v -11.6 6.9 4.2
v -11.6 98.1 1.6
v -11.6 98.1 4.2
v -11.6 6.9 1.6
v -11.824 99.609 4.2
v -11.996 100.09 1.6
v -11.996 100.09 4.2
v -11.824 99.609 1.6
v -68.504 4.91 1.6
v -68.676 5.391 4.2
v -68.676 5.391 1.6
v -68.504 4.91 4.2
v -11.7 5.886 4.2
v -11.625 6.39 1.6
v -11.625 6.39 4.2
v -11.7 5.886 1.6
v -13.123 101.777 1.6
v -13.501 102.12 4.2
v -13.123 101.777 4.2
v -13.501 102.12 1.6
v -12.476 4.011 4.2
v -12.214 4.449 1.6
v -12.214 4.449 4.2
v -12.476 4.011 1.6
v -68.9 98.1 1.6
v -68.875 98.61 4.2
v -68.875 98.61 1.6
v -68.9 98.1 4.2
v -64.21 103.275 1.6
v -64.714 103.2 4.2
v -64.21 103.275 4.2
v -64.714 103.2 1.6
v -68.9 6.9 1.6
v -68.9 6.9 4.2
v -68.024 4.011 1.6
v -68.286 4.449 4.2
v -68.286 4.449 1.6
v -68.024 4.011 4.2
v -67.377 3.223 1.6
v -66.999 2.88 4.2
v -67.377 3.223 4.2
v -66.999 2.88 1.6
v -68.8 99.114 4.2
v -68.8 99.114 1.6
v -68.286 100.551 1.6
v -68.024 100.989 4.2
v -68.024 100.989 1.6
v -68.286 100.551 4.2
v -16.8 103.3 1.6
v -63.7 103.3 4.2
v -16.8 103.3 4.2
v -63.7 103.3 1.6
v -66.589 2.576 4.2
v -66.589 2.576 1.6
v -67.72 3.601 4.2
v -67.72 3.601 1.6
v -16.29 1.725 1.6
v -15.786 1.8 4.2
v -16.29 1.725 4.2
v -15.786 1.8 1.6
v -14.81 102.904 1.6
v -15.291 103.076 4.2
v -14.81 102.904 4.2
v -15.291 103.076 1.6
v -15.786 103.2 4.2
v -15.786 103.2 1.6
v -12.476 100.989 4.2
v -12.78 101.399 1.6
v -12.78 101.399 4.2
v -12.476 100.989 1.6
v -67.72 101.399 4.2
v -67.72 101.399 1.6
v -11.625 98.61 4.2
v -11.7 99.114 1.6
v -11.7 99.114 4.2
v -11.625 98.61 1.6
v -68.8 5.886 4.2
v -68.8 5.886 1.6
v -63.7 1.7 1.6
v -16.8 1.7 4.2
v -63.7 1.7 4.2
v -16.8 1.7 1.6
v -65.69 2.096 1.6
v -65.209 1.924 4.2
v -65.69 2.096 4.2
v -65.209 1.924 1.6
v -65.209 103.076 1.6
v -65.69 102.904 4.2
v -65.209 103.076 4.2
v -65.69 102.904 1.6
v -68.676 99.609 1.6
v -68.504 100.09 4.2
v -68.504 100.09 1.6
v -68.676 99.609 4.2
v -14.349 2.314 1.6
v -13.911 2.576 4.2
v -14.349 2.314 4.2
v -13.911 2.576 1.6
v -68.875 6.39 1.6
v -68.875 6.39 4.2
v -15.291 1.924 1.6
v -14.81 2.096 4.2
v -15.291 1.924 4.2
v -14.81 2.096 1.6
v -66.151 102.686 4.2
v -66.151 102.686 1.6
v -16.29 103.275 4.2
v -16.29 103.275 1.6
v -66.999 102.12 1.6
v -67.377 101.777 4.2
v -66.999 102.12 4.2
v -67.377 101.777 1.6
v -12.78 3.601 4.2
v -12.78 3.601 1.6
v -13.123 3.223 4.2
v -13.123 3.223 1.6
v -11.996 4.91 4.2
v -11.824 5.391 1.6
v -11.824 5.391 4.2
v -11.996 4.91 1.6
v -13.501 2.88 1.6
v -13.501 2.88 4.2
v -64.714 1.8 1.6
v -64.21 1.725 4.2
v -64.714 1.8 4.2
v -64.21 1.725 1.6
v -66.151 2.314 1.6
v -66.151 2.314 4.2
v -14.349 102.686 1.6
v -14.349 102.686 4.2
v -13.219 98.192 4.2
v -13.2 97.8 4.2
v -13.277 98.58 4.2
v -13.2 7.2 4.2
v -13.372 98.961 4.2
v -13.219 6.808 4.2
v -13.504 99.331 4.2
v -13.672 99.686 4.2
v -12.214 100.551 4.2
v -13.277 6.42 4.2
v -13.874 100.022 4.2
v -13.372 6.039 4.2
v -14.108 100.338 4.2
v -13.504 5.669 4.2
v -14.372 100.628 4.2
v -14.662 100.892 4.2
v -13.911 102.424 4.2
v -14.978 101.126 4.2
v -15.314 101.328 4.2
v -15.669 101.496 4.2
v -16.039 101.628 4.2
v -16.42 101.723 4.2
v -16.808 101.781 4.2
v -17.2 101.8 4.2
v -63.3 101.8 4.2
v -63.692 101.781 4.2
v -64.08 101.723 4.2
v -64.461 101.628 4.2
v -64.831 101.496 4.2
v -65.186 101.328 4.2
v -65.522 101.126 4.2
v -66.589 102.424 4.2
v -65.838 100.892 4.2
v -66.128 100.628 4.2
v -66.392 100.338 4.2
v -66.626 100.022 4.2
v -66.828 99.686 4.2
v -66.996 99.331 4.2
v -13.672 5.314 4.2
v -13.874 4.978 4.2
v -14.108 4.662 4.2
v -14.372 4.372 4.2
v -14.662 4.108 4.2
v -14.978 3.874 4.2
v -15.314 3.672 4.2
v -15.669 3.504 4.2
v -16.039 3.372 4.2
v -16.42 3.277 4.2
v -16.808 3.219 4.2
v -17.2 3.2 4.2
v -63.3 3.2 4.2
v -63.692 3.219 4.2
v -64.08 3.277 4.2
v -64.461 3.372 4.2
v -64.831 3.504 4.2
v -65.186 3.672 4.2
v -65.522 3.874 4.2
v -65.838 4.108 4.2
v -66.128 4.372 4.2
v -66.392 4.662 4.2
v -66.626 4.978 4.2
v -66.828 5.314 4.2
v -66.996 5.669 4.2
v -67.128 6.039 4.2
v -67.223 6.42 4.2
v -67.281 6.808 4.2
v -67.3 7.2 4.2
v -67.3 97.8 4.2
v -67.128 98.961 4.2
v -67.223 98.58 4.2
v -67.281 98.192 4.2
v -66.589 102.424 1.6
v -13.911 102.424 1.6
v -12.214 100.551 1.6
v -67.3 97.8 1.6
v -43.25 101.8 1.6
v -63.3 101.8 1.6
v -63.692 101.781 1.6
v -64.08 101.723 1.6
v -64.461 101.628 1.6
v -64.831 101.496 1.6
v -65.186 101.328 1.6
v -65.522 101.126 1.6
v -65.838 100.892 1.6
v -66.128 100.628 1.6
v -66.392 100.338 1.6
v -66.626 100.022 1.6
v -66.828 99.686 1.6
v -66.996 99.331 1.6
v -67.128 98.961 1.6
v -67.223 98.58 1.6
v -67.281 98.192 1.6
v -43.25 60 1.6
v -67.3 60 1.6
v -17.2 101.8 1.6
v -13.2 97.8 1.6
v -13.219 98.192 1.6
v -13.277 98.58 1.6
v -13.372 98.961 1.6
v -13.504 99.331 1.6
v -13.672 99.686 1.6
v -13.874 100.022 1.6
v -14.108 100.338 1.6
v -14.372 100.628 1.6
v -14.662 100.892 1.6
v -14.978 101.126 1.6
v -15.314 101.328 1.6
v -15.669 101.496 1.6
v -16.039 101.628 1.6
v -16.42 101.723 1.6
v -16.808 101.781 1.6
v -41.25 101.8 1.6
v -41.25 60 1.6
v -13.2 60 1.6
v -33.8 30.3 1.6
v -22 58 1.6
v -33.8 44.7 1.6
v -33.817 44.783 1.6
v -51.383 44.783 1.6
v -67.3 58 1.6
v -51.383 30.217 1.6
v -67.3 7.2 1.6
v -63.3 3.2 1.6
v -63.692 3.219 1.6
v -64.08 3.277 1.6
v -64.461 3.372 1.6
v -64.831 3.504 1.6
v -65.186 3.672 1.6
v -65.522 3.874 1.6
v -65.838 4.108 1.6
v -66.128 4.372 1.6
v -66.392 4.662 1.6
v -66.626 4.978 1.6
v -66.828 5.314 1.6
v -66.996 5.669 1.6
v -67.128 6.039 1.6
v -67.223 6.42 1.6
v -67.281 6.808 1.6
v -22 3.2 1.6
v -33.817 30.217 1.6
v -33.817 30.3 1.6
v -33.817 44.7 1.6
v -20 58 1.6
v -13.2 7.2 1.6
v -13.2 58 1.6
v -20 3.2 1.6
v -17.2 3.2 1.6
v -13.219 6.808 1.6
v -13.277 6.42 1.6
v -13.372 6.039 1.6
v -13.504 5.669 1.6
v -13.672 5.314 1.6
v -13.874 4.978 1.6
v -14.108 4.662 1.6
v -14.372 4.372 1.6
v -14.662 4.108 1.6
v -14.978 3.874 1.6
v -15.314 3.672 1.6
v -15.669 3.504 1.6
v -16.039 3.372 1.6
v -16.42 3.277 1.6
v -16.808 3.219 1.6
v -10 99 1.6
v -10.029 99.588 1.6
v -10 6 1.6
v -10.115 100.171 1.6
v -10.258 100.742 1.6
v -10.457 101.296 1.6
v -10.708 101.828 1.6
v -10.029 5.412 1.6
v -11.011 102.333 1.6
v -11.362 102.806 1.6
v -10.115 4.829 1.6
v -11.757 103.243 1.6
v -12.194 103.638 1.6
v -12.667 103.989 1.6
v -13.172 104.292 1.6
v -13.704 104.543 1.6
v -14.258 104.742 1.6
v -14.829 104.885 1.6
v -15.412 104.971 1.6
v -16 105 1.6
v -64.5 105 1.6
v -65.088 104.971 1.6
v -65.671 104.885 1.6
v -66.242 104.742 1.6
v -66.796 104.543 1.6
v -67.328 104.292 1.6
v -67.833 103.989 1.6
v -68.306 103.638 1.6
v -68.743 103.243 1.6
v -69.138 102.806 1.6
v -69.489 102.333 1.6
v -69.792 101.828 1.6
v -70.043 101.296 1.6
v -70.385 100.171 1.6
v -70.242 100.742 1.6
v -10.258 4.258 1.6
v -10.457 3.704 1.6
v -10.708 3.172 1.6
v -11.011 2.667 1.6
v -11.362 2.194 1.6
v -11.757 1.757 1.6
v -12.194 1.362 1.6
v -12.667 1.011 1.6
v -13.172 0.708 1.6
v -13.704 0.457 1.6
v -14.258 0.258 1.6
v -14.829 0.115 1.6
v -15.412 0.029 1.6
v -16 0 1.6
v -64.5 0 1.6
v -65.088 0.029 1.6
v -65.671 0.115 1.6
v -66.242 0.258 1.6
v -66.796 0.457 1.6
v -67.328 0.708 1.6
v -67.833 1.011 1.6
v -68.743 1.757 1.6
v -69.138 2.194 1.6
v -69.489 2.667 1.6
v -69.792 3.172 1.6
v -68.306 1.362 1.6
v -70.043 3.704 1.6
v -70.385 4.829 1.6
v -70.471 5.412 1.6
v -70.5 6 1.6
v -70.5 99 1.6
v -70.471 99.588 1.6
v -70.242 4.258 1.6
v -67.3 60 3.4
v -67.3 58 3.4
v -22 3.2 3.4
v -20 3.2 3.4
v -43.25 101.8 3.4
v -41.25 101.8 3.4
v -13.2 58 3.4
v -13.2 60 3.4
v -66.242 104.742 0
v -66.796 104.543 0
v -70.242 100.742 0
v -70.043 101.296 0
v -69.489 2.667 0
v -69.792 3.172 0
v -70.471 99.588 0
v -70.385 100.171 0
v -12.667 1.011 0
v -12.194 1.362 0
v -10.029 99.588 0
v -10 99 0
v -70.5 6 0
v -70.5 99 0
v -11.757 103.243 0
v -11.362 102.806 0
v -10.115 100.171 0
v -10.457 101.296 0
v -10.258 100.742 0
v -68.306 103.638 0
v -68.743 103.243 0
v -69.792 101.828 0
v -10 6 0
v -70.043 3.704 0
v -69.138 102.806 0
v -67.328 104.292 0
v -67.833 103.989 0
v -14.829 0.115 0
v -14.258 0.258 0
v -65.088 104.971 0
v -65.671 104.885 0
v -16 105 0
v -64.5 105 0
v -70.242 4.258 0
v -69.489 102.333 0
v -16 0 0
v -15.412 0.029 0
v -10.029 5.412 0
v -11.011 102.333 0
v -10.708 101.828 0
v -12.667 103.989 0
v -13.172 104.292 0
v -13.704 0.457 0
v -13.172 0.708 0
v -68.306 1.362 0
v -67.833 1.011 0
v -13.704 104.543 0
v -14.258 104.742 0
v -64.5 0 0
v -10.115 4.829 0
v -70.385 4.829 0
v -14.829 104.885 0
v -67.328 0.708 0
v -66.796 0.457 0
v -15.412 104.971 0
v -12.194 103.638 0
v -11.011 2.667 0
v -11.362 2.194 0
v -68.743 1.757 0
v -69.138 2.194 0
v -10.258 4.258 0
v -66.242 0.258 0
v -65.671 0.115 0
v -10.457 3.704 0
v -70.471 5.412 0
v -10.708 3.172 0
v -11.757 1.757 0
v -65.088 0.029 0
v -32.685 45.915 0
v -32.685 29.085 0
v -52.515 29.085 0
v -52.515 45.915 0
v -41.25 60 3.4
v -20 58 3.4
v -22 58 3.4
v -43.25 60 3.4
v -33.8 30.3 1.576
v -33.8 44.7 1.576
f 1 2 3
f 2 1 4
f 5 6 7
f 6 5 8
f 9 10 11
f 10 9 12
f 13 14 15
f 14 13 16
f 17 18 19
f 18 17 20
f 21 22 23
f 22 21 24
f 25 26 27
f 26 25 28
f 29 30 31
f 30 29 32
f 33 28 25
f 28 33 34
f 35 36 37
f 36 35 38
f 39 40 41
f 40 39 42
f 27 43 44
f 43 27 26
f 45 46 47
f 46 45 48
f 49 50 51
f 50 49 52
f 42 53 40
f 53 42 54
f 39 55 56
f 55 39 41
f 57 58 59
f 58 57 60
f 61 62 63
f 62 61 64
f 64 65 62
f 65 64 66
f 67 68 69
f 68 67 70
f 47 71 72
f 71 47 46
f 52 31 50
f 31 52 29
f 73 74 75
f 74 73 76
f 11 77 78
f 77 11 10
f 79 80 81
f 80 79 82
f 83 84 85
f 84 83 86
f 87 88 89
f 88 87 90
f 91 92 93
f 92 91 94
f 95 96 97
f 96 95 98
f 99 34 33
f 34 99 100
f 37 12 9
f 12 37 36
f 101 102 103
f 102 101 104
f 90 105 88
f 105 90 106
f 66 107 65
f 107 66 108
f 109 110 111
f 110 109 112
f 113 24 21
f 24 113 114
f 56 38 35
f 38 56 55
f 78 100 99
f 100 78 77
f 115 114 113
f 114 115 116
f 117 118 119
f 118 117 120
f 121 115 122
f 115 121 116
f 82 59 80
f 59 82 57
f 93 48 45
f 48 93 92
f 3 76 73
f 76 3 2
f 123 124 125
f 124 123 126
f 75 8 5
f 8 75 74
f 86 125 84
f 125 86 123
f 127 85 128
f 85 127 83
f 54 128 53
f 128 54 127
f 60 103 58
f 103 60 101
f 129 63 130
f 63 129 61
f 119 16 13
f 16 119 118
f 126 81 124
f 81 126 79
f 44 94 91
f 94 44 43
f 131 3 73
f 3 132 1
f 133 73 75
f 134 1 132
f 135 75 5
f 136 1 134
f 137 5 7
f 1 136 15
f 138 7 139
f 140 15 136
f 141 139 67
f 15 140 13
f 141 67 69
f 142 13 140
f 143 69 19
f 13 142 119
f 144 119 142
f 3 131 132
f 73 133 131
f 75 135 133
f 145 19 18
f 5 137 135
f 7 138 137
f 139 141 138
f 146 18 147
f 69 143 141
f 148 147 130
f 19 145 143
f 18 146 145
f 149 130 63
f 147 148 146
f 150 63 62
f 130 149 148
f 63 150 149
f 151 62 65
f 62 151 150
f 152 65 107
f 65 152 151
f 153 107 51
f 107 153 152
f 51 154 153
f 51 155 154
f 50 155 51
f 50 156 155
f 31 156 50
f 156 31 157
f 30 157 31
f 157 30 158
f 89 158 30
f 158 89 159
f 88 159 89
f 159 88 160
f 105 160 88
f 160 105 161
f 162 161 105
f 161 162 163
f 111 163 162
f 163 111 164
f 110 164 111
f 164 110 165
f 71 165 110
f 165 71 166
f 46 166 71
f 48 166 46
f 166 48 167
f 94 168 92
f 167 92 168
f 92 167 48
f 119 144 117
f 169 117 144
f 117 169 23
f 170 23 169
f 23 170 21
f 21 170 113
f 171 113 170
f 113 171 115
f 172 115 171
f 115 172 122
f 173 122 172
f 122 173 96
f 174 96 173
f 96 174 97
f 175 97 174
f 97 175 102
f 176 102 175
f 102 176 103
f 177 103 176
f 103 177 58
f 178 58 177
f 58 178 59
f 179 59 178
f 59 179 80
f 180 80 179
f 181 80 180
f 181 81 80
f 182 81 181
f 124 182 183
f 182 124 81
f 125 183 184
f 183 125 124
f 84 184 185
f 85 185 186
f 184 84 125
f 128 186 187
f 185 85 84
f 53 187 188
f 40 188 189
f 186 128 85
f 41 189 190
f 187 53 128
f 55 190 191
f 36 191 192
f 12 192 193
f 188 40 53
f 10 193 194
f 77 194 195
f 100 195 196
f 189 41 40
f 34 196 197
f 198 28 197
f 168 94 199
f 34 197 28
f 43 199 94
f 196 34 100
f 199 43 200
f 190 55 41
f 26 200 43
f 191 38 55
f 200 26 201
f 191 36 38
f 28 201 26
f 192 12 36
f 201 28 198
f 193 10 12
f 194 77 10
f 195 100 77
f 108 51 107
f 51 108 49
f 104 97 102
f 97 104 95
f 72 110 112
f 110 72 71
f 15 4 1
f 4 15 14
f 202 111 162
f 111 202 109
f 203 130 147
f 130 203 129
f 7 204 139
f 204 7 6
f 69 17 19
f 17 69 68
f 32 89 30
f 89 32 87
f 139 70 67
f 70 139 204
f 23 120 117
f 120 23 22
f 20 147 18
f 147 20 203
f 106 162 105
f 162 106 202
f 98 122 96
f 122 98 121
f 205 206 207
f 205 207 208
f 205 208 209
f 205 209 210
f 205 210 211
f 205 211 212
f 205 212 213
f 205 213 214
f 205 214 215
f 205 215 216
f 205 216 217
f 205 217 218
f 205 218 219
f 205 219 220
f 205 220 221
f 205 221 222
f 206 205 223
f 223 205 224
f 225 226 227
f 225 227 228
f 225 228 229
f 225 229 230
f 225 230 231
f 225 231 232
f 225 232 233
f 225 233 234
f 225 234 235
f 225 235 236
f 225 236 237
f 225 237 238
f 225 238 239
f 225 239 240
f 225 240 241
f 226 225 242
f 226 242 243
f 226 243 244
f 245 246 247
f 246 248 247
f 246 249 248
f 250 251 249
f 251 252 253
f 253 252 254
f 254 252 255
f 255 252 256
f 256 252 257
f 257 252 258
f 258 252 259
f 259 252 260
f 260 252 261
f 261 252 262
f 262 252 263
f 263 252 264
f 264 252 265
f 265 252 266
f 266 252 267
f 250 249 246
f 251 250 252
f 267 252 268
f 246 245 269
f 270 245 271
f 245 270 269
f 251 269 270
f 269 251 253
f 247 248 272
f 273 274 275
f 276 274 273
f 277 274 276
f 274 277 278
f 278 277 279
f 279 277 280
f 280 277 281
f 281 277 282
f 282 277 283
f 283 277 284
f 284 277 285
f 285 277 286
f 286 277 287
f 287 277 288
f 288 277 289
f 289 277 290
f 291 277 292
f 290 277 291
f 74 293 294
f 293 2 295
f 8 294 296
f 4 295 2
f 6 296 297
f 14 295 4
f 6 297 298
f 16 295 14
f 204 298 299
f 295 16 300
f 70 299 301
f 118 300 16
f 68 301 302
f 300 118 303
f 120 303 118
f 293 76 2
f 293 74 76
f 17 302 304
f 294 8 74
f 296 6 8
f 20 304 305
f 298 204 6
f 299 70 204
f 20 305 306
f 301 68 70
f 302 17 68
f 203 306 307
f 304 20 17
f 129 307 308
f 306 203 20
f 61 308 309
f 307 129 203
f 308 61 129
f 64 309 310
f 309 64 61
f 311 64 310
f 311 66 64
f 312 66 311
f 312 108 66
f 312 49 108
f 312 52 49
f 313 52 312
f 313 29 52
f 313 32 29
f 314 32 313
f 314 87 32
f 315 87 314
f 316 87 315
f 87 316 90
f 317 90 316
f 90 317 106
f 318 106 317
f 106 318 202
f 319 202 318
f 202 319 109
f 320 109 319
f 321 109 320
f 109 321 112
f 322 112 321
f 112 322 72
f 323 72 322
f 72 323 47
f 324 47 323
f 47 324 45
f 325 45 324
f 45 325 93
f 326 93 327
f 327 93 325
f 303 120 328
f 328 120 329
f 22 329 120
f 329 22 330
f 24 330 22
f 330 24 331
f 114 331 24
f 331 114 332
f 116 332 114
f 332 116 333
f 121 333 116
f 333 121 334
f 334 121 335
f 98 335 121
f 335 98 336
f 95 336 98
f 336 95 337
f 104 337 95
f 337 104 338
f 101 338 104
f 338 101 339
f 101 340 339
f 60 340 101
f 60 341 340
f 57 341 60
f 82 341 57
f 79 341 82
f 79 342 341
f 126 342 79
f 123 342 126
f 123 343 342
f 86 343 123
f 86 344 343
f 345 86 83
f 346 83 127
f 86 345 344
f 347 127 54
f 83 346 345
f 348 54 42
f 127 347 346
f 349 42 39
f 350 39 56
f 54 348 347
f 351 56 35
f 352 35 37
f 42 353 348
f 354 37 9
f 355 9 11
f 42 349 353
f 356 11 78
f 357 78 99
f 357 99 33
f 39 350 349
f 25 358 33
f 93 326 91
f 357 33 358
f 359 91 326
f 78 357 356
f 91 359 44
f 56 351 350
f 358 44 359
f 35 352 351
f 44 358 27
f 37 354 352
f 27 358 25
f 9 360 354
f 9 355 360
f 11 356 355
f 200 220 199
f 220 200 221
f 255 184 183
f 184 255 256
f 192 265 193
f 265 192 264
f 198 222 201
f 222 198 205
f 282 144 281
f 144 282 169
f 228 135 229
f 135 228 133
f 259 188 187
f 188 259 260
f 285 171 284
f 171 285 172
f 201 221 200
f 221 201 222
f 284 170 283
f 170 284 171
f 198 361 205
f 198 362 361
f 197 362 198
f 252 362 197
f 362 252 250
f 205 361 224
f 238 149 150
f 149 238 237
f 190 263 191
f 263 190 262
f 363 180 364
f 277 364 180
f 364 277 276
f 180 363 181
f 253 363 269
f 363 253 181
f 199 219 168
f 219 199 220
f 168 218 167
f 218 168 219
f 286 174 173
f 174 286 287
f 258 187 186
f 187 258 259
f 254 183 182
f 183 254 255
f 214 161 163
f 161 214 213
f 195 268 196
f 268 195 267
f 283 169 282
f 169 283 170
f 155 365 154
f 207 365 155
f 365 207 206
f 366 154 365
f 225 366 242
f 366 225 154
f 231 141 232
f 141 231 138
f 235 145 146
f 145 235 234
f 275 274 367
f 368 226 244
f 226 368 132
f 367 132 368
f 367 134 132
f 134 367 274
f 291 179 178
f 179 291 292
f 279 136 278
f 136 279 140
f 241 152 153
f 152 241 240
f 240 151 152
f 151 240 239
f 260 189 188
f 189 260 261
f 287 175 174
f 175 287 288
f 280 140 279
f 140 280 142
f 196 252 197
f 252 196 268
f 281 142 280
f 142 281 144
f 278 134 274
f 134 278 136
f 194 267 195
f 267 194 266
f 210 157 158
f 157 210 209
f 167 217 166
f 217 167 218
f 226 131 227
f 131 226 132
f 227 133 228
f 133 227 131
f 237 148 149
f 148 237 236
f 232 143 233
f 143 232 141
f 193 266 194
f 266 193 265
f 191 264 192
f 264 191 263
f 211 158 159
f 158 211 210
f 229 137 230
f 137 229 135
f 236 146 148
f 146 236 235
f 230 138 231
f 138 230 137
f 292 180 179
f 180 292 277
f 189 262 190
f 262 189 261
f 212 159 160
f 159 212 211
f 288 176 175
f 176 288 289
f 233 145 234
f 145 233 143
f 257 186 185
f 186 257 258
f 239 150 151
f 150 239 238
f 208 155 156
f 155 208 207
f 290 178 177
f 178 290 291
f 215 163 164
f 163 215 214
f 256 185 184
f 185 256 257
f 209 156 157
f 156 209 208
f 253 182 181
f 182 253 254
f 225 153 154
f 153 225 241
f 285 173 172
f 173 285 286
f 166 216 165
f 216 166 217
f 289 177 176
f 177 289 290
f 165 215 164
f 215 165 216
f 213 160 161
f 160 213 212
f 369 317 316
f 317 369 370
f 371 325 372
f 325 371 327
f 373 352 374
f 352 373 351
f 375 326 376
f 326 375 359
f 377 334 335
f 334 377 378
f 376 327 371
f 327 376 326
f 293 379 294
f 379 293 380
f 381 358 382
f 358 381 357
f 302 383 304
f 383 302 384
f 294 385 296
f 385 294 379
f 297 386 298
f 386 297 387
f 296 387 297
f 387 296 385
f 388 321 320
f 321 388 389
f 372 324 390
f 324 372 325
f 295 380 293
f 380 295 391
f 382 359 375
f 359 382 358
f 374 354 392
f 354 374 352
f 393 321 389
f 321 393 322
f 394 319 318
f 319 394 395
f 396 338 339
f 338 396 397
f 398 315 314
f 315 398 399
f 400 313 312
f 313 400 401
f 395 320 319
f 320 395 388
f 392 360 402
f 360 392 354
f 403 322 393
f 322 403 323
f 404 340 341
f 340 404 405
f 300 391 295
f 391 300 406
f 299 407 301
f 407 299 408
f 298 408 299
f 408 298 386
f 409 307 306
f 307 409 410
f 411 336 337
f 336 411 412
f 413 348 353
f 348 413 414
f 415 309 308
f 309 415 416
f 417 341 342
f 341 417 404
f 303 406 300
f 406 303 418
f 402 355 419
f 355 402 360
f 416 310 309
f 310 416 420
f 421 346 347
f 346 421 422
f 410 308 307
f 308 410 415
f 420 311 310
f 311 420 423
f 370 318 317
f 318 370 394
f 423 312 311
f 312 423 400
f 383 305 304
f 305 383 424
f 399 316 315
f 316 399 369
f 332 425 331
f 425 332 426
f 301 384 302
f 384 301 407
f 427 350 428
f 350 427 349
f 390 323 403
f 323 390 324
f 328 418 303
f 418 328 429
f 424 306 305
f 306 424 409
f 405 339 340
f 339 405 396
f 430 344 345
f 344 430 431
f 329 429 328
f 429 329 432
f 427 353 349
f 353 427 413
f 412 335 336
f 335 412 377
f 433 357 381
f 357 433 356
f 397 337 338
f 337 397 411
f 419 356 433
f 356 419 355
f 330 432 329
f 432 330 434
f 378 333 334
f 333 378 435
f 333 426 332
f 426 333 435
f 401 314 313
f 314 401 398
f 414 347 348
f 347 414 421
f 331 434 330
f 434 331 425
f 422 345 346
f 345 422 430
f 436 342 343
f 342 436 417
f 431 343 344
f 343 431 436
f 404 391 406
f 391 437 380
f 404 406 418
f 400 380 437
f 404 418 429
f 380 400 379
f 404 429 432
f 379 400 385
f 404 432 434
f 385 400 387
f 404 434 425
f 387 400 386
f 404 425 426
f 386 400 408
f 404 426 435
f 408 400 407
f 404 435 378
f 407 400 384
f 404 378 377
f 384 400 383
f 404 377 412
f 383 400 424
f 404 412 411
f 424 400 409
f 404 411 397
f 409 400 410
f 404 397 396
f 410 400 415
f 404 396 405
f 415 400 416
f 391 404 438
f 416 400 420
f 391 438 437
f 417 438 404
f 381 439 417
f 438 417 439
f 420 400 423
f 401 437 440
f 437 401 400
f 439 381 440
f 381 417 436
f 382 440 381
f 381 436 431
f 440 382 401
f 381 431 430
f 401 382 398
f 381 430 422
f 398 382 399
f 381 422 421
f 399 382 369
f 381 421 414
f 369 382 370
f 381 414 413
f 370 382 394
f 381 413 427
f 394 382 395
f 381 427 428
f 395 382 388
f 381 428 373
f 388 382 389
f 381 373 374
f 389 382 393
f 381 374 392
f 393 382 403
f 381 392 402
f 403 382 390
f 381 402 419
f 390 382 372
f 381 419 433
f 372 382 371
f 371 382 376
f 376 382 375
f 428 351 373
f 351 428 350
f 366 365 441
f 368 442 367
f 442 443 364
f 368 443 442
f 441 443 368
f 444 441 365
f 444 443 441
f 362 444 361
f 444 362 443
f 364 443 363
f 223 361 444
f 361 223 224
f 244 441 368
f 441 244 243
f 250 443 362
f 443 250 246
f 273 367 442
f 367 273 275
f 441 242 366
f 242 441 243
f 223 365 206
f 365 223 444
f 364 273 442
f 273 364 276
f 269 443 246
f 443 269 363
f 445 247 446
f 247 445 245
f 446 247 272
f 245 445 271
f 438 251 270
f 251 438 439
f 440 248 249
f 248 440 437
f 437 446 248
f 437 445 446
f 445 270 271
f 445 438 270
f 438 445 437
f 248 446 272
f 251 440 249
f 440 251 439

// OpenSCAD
// Global config variables
enclosure_height = 16;
enclosure_length = 105; // Note: 105mm was a bit too small. Recommend going to 110mm at some point.
enclosure_width = 60.5;
enclosure_radius = 40;
wall_thickness = 1.6;
$fn = 64; // curved resolution (used for cylinders and spheres)

//enclosureBase();

//#displayInternalParts();

//internalSupport();

translate([9,-50,0]) {
    //lensRound(0.4);
    //lensRound(6);
}

translate([-enclosure_width - 10,0,0]) {
    difference() {
        enclosureLid();
        translate([19.3,30.3,-2]) {
            cube([17.4, 14.4, 5]);
        }
        translate([29.4,37.5,-0.1]) {
            rotate([0,0,45])cylinder(8,12,4,$fn=4);
        }
        translate([26.4,37.5,-0.1]) {
            rotate([0,0,45])cylinder(8,12,4,$fn=4);
        }

    }
}

module internalSupport() {
    support_padding = wall_thickness + 0.1;
    support_offset = 50;
    support_length = enclosure_length - support_offset - support_padding;
    support_width = enclosure_width - support_padding * 2;
    
    translate([enclosure_width / 2 - 12.4,support_offset + 30,9]) {
        cylinder(r=3, h=2.2);
        cylinder(r=1.47, h=4);
    }
    translate([enclosure_width / 2 + 9,support_offset + 30,9]) {
        cylinder(r=3, h=2.2);
        cylinder(r=1.47, h=4);
    }
    translate([enclosure_width / 2 - 11.8,support_offset + 3,9]) {
        cylinder(r=3, h=2);
    }
    translate([enclosure_width / 2 + 9,support_offset + 18,9]) {
        cylinder(r=3, h=2);
    }
    
    difference() {
        translate([support_padding,support_offset,9]) {
            difference() {
                rcube([support_width, support_length,1.2], 5);
                translate([6,21,-2]) {
                    cube([7, support_length - 26, 5]);
                }
                translate([support_width - 16,21,-2]) {
                    cube([10, support_length - 26, 5]);
                }
                translate([support_width / 2 - support_width / 8 - 1.7,support_length - 38,-2]) {
                    cube([support_width / 4, 20, 5]);
                }
                translate([support_width / 2 - support_width / 8 - 1.7,support_length - 12,-2]) {
                    cube([support_width / 4, 6, 5]);
                }
                translate([support_width / 2 - support_width / 8 - 1.7,-1,-2]) {
                    cube([support_width, 14, 5]);
                }
                translate([support_width / 2 - support_width / 8 - 5,-1,-2]) {
                    cube([support_width, 4, 5]);
                }
            }
        }
        translate([3.5 + support_padding,enclosure_length - 3.5 - support_padding,6]) {
            cylinder(r=1.4, h=(10 - support_padding));
        }
        translate([enclosure_width - 3.5 - support_padding,enclosure_length - 3.5 - support_padding,6]) {
            cylinder(r=1.4, h=(10 - support_padding));
        }
        translate([enclosure_width - 2.5 - support_padding,support_offset + 17.5 + support_padding,6]) {
            cylinder(r=1.4, h=(10 - support_padding));
        }
        translate([3.5 + support_padding,support_offset + 17.5 + support_padding,6]) {
            cylinder(r=1.4, h=(10 - support_padding));
        }
        translate([0,60.8,6]) {
            cube([12.4, 2, 12]);
        }
    }
}

module displayInternalParts() {
    // Power switch
    translate([10,-1.2,4])cube([14.2,12,8.8]);
    translate([12,-3.4,5])rotate([0,0,20])cube([10,3,7]);
    translate([13,10,6])cube([1.2,6,4]);
    translate([20,10,6])cube([1.2,6,4]);
    
    // Battery
    translate([2,24,2]) {
        // 500 mAh
        cube([29,36,6]);
        // 400 mAh
        //#cube([26,37,5]);
    }

    // Feather board
    translate([enclosure_width - 27,wall_thickness,5]) {
        thingPlusBoard();
    }
    
    // OLED
    
}

module enclosureLid() {
    lid_offset = wall_thickness + 0.1;
    rcube([enclosure_width,enclosure_length,wall_thickness], 6);
    translate([wall_thickness,58,lid_offset - 0.1])cube([enclosure_width - wall_thickness * 2, 2, 1.8]);
    translate([enclosure_width/2 - 3,58,lid_offset - 0.1])cube([2, 44, 1.8]);
    translate([enclosure_width - 12,lid_offset,lid_offset - 0.1])cube([2, 58, 1.8]);
    difference() {
        
        // Make the cylinder hollow
        translate([wall_thickness,lid_offset,lid_offset - 0.1]) {
            rcube([enclosure_width - wall_thickness * 2, enclosure_length - lid_offset * 2,2.6], 5.2);
          inner_height = enclosure_height;
          inner_radius = enclosure_radius - (lid_offset * 2);
        }
        translate([wall_thickness*2,wall_thickness*2,1]) {
            rcube([enclosure_width - wall_thickness * 4, enclosure_length - wall_thickness * 4,6], 4);
          inner_height = enclosure_height;
          inner_radius = enclosure_radius - (wall_thickness * 2);
        }
    }
}

module enclosureBase() {
    difference() {
        enclosureWalls();
        // Micro usb slot
        translate([enclosure_width - 19.4,-1,5.7])cube([8.8,4,3.8]);
        // Power switch
        translate([10,-1,4])cube([14.2,8,8.8]);
        // Camera lense
        translate([9,enclosure_length - 43.5,-2]) {
            translate([21,21,0]) cylinder(r=40.2/2,h=8);
        }
        // Lens notch
        translate([16,enclosure_length - 9,-1]) {
            rotate([0,0,45]) {
                cube([3,4,3]);
            }
        }
        // Camera strap
        translate([5.4,enclosure_length - 9,8]) {
            rotate([10,45,15]) {
                cube([1.6,20,1.6]);
            }
        }
        translate([4.8,enclosure_length - 9.6,6.6]) {
            rotate([0,45,-10]) {
                cube([1.6,20,1.6]);
            }
        }
    }
    
    difference() {
        translate([enclosure_width - 24,4.1,0]) {
            difference() {
                featherScrew();
                translate([-3.1,-2.5,5]) {
                    thingPlusBoard();
                }

            }
        }
        // Battery
        translate([3,24,1]) {
            cube([29,36,6]);
        }
        // Front face
        translate([20,-1.1,-1]) {
            cube([41,wall_thickness+1,enclosure_height + 2]);
        }
    }
}

module rcube(size, radius) {
    // rcube module found here: https://www.prusaprinters.org/parametric-design-in-openscad/
    hull() {
        translate([radius, radius]) cylinder(r = radius, h = size[2]);
        translate([size[0] - radius, radius]) cylinder(r = radius, h = size[2]);
        translate([size[0] - radius, size[1] - radius]) cylinder(r = radius, h = size[2]);
        translate([radius, size[1] - radius]) cylinder(r = radius, h = size[2]);
        //translate([1, size[1] - 1]) cylinder(r = 1, h = size[2]);
    }
}

// Draw exterior walls for the enclosure
module enclosureWalls() {
    translate([7,enclosure_length - 30,1]) {
        rotate([0,0,14]) {
            cube([4,3,3.6]);
        }
    }
    translate([1.6,22,0])cube([7,1.6,10]);
    translate([0,61,0])cube([12,1.6,10]);
    translate([enclosure_width - 28.7,24,0])cube([1.6,36,10]);
    // Cylinder with a smaller cylinder cut out of it
    difference() {
        rcube([enclosure_width,enclosure_length,enclosure_height], 6);

        // Make the cylinder hollow
        translate([wall_thickness,wall_thickness,wall_thickness]) {
            rcube([enclosure_width - wall_thickness * 2, enclosure_length - wall_thickness * 2,enclosure_height], 5);
          inner_height = enclosure_height;
          inner_radius = enclosure_radius - (wall_thickness * 2);
        }
        // Radial vents
        translate([enclosure_width / 2,enclosure_length / 1.5,enclosure_height - 14]) {
          radialVents(2, 7, 2, 3, enclosure_length + 20);
        }
        // Through hole for screw
        translate([enclosure_width - 24,4.1,-2]) {
            cylinder(r=1.2, h=16);
        }
        // Through hole for screw
        translate([enclosure_width - 6.22,4.1,-2]) {
            cylinder(r=1.2, h=16);
        }
    }
}

// Radial vents
// ventSpacing in mm
// horizontalSpacing in degrees (divisible by 360)
module radialVents(verticalSpacing, horizontalSpacing, size, numRows, ventRadius) {
    for ( m = [0 : numRows] ){
        //for ( k = [102 : 130] ){
        for ( k = [94 : 101] ){
            // Rotate by 45 degrees to avoid needing support when printing
            translate([0,0,m * verticalSpacing + 4]) {
                offset = horizontalSpacing / 2;
                rotate( k * horizontalSpacing - m * offset, [0, 0, 1]){
                    rotate( 45, [0, 1, 0]) {
                        cube([size, ventRadius, size]);
                    }
                }
            }
        }
    }
}

// Thing Plus with usb
module thingPlusBoard() {
    difference() {
        rcube([23.8,59,1.19], 2.5);
        translate([2.54,2.54,-2])cylinder(r=1.35, h=14);
        translate([21.26,2.54,-2])cylinder(r=1.35, h=14);
    }
    translate([7.9,-1.6,1]) {
        cube([8, 5, 2.7]);
    }
    translate([1.4,30,1]) {
        cube([20.5, 20, 4]);
    }
    translate([1.4,48,1]) {
        cube([20.5, 11, 2]);
    }
    translate([15.33,17.42,-2])cylinder(r=1.5, h=2);
    translate([6.7,17.42,-2])cylinder(r=1.5, h=2);
}

// Screw mount spaced for a feather board
module featherScrew() {
    translate([0,0,0])screwmountM25();
    translate([-2.7,53.4,0])frictionmount(1.1, 6.1);
    translate([19,55.5,0])frictionmount(1.1, 6.1);
    translate([17.78,0,0])screwmountM25();
}

// M2.5 screw mount for 6mm length M2.5 screws
module screwmountM25() {
    translate([0,0,1.9]) {
        rotate_extrude(convexivity = 10) {
            translate([2.5,0,0]) {
                intersection() {
                    square(8);
                    difference() {
                        square(5, center = true);
                        translate([4,4])circle(4);
                    }
                }
            }
        }
    }
    difference() {
        cylinder(r=5, h=2);
        translate([0,0,-2]) {
            cylinder(r=1.2, h=8);
        }
    }
 
    difference() {
        cylinder(r=2.5, h=5);
        translate([0,0,-2]) {
            cylinder(r=1.35, h=8);
        }
    }
}

// Friction mount for screw holes
module frictionmount(pegRadius, pegHeight = 7, lift = 0) {
 translate([0,0,2.8]) {
        rotate_extrude(convexivity = 10) {
            translate([2.5,0,0]) {
                intersection() {
                    square(8);
                    difference() {
                        square(5, center = true);
                        translate([4,4])circle(4);
                    }
                }
            }
        }
    }
    cylinder(r=5, h=3);
    cylinder(r=2.5, h=pegHeight);
    cylinder(r=pegRadius, h= (pegHeight + lift));
}

module lensRound(lensHeight = 0) {
    difference() {
        translate([21,21,0]) cylinder(r=44/2,h=2 + lensHeight);
        translate([21,21,1]) cylinder(r=38/2,h=14);
        translate([21, 21, 0])roundCamera();
    }
    difference() {
        translate([21,21,0]) cylinder(r=40/2,h=6 + lensHeight);
        translate([21,21,1]) cylinder(r=38/2,h=15);
        #translate([21, 21, 0])roundCamera();
        translate([10,36,3.5 + lensHeight])rotate([0,0,0])cube([20,5,3]);
    }
    translate([22.5,-1,4.2 + lensHeight])rotate([0,0,6])cube([2.7,3.5,1.8]);
    translate([22.5,-1,4.2 + lensHeight])rotate([0,0,16])cube([2.7,3,1.8]);
    translate([8.5,35.3,4 + lensHeight])rotate([0,0,133])cube([2,3,2]);
    translate([10.8,10.8,0])screwmountA(lensHeight);
    translate([10.8,31.2,0])screwmountC(lensHeight);
    translate([31.2,31.2,0])screwmountA(lensHeight);
    translate([31.2,10.8,0])screwmountC(lensHeight);
}


module roundCamera() {
    translate([0,0, -1])cylinder(r=9.4/2,h=12);
    translate([0,0, -2])cylinder(r1=16/2, r2=9.4/2,h=3);
}

module screwmountA(lift = 6) {        
    cylinder(r=4, h=lift + 2);
    difference() {
        cylinder(r=3, h= lift + 6);
        cylinder(r=1.35, h= lift + 8); 
    }
}

module screwmountC(lift = 6) {        
    cylinder(r=4, h=lift + 2);
    cylinder(r=3, h=lift + 6);
    cylinder(r=1.45, h=lift + 8); 
}
